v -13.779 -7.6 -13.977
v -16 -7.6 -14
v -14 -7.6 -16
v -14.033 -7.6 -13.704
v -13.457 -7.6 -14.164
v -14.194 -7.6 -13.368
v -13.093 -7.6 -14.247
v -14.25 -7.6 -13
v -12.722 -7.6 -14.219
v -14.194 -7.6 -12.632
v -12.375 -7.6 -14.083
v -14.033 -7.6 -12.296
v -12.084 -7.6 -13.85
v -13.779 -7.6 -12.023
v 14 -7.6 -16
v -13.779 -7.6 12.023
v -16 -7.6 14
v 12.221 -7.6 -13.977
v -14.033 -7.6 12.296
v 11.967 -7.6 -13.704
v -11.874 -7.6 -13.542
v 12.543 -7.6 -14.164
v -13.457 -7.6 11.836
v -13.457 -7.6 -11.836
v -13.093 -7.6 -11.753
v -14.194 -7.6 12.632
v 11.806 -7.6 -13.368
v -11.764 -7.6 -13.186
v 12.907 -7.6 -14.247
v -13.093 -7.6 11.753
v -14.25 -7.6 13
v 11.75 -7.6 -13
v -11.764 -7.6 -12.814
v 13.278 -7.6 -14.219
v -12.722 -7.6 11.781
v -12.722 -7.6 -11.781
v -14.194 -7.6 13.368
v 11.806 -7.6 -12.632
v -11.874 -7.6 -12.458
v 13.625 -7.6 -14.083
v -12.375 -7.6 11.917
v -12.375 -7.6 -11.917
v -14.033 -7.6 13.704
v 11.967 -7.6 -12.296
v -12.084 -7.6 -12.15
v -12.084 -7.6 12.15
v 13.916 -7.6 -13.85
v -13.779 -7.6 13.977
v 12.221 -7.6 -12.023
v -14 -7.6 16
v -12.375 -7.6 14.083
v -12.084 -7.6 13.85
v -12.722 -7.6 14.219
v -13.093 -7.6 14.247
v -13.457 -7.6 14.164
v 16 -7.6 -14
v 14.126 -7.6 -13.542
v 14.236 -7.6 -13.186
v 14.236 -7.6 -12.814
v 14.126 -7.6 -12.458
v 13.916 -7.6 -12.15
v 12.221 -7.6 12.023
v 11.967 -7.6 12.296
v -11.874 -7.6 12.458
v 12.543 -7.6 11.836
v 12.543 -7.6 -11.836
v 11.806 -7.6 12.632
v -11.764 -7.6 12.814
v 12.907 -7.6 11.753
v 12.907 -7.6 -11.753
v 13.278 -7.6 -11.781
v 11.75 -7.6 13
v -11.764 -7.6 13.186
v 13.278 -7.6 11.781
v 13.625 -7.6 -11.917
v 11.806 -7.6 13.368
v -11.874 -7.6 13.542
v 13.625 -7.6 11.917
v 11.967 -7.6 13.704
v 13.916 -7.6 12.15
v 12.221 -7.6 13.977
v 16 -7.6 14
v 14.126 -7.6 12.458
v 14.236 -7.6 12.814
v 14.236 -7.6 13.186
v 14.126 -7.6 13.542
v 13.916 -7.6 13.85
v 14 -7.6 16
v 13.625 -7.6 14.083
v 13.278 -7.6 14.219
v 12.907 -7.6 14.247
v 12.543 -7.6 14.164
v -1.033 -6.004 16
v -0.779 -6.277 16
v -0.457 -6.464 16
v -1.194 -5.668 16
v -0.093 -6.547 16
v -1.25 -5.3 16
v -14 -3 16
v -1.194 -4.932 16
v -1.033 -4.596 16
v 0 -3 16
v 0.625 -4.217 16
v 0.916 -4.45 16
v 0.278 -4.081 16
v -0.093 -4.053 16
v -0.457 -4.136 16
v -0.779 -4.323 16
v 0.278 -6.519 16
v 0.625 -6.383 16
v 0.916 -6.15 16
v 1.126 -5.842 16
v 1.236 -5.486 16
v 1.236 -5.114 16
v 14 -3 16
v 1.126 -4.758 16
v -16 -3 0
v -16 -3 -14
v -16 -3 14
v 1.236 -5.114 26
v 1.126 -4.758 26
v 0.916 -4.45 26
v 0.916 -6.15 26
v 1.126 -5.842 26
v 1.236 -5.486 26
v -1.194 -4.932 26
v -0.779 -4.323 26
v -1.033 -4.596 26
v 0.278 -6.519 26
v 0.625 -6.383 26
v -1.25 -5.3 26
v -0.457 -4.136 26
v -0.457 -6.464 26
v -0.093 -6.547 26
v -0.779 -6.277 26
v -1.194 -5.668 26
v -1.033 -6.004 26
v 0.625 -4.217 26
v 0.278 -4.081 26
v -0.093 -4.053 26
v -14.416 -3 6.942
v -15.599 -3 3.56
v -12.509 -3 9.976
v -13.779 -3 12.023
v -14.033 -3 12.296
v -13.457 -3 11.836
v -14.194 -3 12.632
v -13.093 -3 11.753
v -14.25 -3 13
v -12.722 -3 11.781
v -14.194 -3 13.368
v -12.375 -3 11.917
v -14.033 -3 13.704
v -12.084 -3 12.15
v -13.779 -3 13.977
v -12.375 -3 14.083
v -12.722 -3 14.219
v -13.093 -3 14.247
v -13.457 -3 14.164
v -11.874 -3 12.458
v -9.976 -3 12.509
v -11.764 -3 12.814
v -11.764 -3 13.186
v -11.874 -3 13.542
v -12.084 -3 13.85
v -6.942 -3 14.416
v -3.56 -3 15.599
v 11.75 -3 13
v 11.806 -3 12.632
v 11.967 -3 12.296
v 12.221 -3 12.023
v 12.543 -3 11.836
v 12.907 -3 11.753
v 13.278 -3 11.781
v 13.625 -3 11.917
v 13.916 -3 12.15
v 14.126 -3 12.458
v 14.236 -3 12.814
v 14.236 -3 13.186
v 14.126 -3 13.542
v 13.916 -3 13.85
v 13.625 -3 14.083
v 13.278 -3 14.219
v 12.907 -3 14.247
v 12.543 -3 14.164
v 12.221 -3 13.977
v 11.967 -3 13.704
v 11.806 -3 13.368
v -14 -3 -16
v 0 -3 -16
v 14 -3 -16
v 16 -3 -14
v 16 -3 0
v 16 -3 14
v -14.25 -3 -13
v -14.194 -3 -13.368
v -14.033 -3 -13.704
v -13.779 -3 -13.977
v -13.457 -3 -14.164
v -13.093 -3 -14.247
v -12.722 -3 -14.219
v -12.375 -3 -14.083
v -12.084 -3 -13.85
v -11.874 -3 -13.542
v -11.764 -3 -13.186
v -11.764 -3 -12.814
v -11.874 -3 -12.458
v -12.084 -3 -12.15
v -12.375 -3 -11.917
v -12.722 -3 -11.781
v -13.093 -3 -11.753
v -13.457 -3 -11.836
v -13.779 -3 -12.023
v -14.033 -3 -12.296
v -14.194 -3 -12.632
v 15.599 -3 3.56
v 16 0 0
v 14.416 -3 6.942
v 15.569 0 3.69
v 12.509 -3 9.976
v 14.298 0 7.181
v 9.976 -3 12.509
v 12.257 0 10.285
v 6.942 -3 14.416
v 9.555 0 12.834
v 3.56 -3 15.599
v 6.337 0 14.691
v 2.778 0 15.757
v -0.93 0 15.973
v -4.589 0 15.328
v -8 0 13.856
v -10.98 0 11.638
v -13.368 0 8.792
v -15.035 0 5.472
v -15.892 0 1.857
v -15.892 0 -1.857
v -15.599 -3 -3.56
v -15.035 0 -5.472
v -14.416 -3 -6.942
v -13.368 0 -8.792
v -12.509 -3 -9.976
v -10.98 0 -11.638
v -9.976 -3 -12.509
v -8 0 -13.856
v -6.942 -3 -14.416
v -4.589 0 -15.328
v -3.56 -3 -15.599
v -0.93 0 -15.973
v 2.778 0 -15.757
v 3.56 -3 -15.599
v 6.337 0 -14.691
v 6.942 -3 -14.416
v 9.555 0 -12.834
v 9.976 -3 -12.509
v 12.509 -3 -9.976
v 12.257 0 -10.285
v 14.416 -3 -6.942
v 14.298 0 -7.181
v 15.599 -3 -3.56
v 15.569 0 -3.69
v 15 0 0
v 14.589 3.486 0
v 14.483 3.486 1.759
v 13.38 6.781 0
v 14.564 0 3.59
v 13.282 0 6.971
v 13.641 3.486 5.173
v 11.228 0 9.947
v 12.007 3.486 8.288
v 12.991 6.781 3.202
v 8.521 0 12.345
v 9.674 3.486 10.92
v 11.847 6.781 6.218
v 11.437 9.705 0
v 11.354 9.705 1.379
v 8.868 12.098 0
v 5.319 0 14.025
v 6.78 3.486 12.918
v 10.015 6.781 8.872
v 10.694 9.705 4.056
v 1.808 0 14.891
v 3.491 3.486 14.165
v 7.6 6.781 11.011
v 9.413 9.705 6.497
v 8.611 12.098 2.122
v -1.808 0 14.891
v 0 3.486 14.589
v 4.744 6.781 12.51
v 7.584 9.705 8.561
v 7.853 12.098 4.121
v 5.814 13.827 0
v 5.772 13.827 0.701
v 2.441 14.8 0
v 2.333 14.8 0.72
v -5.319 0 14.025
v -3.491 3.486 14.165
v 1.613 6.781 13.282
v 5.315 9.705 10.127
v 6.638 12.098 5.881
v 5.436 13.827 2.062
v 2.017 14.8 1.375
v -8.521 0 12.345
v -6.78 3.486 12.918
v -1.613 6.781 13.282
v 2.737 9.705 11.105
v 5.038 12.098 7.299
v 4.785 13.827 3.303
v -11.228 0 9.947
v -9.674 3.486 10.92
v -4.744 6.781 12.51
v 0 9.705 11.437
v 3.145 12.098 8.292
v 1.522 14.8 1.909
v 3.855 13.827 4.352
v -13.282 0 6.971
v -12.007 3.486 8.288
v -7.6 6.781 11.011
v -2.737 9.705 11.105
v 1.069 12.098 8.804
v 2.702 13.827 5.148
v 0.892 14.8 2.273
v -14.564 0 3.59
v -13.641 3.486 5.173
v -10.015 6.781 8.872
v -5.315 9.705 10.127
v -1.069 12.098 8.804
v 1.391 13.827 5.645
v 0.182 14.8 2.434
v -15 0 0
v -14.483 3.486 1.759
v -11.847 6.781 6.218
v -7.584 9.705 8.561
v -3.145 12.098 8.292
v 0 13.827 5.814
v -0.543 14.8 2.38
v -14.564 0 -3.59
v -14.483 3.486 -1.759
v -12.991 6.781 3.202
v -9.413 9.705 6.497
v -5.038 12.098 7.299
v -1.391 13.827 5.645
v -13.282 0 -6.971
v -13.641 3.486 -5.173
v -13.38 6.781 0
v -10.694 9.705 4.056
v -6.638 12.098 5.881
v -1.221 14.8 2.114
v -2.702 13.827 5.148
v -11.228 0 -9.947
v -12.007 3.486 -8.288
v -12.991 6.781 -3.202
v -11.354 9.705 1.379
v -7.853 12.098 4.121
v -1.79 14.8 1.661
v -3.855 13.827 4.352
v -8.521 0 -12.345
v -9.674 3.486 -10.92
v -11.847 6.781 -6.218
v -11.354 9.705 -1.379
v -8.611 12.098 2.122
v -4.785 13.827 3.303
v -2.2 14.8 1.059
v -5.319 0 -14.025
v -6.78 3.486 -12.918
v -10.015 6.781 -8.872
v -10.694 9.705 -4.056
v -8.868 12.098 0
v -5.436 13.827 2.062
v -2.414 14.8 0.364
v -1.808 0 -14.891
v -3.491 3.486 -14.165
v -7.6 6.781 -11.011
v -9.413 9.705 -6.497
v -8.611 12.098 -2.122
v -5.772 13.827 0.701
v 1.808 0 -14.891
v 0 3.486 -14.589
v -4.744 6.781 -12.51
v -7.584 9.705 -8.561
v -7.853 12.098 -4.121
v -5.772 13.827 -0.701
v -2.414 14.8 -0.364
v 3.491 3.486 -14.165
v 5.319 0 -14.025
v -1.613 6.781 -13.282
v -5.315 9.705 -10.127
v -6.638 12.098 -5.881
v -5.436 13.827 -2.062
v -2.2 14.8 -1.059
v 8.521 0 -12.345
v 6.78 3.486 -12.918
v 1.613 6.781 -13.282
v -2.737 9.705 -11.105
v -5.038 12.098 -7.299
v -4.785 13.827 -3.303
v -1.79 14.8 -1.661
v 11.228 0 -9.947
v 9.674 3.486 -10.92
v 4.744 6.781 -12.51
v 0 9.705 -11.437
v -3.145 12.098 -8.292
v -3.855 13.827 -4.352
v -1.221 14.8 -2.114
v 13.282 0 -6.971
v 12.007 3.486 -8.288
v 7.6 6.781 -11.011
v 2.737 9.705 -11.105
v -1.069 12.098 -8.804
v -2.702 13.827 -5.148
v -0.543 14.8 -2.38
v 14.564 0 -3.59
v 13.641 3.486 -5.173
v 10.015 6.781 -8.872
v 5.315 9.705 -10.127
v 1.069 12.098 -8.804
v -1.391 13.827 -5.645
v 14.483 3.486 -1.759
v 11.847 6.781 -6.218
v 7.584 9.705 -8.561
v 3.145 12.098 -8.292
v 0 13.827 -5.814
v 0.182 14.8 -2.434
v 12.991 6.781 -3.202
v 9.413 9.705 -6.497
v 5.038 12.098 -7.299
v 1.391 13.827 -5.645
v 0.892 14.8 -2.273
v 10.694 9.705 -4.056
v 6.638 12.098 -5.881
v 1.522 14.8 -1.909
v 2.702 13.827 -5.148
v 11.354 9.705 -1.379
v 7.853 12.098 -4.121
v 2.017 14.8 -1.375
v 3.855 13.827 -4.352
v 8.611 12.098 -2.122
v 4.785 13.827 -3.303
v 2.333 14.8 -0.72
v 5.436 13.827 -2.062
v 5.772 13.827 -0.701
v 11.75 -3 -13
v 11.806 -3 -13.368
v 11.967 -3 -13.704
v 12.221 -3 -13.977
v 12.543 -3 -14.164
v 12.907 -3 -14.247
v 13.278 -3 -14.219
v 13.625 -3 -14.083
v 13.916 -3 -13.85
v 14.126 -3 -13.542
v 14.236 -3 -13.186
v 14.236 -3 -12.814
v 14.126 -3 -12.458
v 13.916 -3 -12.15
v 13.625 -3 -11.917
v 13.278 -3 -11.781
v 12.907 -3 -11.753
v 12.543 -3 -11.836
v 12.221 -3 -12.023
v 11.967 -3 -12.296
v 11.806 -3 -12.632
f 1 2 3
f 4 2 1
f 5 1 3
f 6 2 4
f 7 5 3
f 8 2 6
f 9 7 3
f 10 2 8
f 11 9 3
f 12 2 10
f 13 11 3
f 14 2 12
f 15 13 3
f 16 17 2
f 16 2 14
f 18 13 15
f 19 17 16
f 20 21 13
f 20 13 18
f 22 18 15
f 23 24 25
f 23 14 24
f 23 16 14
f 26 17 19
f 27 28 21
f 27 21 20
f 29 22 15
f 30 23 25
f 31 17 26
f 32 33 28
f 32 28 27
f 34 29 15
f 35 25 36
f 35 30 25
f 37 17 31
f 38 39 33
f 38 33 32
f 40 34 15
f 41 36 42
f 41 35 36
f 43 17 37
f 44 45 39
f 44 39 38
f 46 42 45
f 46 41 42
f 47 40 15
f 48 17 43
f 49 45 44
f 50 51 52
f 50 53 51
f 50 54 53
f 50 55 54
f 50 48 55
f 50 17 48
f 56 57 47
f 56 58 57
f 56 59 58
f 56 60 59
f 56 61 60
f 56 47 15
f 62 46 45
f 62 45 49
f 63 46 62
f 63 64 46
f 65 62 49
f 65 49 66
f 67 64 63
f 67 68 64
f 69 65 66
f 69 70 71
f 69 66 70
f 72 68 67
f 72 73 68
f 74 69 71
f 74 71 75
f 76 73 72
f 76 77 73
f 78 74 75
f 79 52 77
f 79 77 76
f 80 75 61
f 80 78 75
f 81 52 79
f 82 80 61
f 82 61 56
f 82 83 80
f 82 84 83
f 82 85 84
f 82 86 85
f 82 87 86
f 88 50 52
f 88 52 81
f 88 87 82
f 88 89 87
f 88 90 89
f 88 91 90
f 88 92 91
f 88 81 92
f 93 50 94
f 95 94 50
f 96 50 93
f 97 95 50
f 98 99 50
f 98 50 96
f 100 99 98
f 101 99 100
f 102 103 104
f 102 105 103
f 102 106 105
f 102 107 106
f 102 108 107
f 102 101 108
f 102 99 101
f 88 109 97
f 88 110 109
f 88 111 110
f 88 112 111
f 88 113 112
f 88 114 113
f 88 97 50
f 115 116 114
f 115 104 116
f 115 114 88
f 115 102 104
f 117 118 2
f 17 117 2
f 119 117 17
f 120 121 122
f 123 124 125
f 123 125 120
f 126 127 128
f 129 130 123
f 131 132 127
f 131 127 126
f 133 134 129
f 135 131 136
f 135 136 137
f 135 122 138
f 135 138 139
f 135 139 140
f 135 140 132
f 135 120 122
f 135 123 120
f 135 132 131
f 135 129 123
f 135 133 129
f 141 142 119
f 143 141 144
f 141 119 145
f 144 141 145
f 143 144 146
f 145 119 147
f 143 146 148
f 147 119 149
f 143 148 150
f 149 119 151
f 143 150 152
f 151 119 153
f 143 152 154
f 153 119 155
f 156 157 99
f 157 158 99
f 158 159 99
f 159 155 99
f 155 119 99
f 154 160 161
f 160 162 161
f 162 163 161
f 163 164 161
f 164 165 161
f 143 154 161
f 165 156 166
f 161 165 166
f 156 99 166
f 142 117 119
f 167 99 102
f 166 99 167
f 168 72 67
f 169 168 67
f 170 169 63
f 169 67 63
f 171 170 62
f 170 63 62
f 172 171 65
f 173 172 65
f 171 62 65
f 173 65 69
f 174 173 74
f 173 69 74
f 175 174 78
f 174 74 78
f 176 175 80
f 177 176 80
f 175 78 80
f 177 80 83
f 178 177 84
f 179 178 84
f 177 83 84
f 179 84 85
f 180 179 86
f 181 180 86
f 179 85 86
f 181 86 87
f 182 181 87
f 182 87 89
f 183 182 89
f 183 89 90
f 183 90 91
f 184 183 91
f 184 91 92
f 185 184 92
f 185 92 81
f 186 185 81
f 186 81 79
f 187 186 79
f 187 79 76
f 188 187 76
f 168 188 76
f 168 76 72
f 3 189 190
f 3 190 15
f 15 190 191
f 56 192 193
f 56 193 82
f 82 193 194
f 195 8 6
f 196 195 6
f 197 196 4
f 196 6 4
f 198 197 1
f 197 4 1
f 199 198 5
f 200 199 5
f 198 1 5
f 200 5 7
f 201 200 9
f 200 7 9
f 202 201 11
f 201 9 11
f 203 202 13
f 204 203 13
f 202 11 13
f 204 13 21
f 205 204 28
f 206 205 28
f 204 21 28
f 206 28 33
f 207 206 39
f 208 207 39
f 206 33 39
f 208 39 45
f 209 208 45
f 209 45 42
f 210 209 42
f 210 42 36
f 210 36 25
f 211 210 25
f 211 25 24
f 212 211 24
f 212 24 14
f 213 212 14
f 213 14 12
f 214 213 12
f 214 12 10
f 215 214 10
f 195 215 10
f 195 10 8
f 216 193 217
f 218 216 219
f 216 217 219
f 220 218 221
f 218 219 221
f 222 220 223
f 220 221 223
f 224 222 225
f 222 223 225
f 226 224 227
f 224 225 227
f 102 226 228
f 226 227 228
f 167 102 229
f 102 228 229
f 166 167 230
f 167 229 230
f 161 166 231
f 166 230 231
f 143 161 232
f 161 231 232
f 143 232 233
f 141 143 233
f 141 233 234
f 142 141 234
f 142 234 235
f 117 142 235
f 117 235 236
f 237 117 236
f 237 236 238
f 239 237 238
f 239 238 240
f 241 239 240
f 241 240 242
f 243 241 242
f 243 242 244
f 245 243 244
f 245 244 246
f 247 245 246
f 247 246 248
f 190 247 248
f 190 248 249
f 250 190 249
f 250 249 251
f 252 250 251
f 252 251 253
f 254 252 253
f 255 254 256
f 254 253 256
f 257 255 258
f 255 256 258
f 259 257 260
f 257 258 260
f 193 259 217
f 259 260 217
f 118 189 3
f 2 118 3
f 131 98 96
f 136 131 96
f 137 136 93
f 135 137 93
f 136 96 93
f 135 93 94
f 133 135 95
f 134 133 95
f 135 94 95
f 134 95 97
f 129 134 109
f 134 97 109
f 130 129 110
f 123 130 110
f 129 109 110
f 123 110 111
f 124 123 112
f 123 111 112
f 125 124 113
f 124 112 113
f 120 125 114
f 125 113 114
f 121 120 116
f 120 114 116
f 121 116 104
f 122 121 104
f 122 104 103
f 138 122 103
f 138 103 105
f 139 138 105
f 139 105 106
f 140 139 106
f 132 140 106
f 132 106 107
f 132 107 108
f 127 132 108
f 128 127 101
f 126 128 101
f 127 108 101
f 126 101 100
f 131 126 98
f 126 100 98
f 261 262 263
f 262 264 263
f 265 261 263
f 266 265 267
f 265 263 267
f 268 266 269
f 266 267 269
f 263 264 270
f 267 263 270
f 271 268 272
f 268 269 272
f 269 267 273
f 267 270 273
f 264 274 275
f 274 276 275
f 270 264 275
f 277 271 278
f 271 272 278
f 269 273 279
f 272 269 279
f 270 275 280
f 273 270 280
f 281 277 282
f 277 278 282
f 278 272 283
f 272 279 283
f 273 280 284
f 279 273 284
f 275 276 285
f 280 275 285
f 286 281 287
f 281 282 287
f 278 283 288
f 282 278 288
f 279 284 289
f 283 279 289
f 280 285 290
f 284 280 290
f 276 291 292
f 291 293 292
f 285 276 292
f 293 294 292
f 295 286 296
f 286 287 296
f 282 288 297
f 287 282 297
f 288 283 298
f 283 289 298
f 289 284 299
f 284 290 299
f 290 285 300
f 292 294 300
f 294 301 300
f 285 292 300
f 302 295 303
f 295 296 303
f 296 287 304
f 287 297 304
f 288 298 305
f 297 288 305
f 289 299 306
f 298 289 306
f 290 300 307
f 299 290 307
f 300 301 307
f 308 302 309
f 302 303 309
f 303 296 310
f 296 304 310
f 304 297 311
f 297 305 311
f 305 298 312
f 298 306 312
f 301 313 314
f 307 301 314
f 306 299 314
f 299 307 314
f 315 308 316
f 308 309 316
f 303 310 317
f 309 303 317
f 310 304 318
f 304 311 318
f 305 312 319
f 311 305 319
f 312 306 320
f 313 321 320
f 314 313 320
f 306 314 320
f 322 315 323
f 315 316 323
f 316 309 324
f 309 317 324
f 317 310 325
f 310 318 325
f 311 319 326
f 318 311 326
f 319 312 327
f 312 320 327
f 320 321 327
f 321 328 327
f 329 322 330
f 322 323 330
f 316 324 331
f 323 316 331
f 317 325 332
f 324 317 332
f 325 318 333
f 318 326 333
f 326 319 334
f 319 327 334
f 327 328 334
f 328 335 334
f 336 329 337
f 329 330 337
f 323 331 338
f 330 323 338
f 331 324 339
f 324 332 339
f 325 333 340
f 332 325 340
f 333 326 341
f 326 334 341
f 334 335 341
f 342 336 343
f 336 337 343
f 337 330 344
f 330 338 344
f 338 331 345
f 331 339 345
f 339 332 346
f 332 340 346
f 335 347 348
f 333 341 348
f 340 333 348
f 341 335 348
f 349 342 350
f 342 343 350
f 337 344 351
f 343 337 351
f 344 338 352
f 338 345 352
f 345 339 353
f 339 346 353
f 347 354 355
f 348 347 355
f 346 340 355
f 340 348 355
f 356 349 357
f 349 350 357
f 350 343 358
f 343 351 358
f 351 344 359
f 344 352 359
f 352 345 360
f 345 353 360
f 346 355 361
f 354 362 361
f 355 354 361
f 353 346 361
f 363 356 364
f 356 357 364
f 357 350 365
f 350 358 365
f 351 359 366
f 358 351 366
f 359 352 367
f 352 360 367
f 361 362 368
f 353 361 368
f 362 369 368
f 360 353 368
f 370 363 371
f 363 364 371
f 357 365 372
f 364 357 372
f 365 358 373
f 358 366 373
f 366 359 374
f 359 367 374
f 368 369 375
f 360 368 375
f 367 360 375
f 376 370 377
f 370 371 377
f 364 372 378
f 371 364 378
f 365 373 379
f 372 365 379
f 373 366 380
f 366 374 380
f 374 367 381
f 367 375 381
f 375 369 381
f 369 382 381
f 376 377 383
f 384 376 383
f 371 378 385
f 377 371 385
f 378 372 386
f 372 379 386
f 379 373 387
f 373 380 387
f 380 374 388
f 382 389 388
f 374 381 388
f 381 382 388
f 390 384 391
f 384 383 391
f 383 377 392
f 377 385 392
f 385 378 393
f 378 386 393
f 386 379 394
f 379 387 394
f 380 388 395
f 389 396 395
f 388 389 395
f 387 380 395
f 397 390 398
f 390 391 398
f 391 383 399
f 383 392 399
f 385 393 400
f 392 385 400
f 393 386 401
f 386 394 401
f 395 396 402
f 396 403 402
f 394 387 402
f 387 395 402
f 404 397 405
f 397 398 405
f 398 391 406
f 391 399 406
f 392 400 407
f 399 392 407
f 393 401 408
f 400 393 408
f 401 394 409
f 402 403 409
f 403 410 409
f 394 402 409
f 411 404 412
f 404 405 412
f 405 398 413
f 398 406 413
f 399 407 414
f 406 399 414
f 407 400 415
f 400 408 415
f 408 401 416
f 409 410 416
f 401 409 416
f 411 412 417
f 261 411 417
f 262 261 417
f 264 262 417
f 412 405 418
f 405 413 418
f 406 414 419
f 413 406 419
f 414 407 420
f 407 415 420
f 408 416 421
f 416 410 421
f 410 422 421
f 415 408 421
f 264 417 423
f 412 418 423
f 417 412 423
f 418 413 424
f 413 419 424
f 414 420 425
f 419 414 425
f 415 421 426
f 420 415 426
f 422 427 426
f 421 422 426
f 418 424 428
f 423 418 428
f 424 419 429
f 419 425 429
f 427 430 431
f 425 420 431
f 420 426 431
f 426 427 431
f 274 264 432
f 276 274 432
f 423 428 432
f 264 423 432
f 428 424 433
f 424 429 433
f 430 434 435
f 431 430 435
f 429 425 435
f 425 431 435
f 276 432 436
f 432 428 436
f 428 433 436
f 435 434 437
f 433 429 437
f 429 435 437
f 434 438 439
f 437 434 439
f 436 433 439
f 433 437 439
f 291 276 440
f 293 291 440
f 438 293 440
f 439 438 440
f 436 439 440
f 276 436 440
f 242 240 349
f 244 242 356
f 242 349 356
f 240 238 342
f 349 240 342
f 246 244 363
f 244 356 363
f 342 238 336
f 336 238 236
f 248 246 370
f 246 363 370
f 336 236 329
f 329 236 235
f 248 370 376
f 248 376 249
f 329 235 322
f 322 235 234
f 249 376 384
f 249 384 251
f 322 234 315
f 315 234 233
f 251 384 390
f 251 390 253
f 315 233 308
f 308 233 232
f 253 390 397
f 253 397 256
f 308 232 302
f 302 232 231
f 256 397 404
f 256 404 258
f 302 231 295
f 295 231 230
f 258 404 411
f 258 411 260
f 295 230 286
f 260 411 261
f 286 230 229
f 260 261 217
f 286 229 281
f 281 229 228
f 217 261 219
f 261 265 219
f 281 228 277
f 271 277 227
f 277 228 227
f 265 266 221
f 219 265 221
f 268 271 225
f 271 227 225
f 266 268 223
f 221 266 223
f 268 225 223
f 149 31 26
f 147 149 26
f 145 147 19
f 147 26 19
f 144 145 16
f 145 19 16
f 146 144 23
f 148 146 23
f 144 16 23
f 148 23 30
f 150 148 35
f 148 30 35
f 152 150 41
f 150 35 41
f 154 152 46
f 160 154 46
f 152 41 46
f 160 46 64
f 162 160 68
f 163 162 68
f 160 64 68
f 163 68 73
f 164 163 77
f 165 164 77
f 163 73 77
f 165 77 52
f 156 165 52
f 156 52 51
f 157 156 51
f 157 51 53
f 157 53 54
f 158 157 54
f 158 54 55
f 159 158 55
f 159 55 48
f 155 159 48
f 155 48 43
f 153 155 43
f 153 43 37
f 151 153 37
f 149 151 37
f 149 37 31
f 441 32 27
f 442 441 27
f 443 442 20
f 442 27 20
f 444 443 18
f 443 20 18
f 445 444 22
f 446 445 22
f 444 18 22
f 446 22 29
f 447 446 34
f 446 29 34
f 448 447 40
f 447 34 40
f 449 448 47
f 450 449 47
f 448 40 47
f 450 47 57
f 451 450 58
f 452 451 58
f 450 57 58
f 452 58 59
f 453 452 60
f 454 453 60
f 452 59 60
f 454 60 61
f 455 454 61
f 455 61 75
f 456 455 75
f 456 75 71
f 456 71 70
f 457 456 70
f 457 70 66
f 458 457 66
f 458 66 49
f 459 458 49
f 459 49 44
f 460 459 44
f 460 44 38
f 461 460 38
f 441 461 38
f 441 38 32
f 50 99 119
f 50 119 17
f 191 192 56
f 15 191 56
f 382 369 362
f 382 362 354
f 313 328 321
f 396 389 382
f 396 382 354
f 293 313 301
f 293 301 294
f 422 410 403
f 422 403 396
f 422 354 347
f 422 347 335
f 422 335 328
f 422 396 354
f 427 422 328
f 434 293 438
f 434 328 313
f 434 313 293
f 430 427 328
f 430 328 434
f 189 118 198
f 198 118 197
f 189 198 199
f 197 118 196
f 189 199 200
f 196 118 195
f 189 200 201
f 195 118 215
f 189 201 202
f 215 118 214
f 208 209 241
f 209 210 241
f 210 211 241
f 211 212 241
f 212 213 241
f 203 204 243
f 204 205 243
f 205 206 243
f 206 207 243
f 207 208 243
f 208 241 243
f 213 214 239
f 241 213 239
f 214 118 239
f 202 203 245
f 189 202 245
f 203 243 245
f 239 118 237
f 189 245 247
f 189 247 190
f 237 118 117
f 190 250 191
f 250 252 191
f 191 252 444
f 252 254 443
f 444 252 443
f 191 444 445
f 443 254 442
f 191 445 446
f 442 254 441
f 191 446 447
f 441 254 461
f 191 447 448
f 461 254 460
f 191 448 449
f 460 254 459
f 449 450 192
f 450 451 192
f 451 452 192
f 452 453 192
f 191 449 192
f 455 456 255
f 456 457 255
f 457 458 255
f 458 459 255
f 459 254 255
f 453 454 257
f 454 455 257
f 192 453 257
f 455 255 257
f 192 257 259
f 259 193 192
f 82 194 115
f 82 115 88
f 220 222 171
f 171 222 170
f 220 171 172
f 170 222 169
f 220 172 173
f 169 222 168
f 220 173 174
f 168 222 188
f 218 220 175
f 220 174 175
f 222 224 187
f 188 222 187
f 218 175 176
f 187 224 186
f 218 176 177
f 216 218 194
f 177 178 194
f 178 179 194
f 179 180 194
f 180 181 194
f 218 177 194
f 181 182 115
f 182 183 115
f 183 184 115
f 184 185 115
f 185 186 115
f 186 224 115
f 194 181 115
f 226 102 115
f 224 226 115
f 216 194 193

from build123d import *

# Parameters (mm, degrees)
SKETCH2_R             = 16
BOSS_EXTRUDE1_DEPTH   = 3
SKETCH3_W             = 32
SKETCH3_H             = 32
BOSS_EXTRUDE2_DEPTH   = 4.6
F_2_5MM_DOWEL_HOLE1_D = 2.5
CHAMFER1_SIZE         = 2
SKETCH11_R            = 1.25
BOSS_EXTRUDE3_DEPTH   = 10
SKETCH12_R            = 16
CUT_EXTRUDE1_DEPTH    = 38.865023439


with BuildPart() as part:
    # Sketch1 → Revolve1 (revolve)
    with BuildSketch(Plane.XY):
        with BuildLine():
            Line((0, 0), (15, 0))
            ThreePointArc((15, 0), (10.606601718, 10.606601718), (0, 15))
            Line((0, 15), (0, 0))
        make_face()
    revolve(axis=Axis((0, 15, 0), (0, -1, 0)))

    # Sketch2 → Boss-Extrude1 (add)
    with BuildSketch(Plane.XZ):
        Circle(SKETCH2_R)
    extrude(amount=BOSS_EXTRUDE1_DEPTH)

    # Sketch3 → Boss-Extrude2 (add)
    with BuildSketch(Plane.XZ.offset(3)):
        Rectangle(SKETCH3_W, SKETCH3_H)
    extrude(amount=BOSS_EXTRUDE2_DEPTH)

    # Ø2.5mm Dowel Hole1 (through all)
    with Locations(Plane(origin=(0, -3, 0), x_dir=(1, 0, 0), z_dir=(0, 1, 0))):
        with Locations((-13, 13), (13, -13), (13, 13), (-13, -13)):
            Hole(F_2_5MM_DOWEL_HOLE1_D / 2)

    # Chamfer1
    chamfer1_edges = [part.edges().sort_by_distance(p)[0] for p in [
        (16, -5.3, -16),
        (16, -5.3, 16),
        (-16, -5.3, 16),
        (-16, -5.3, -16),
    ]]
    chamfer(chamfer1_edges, length=CHAMFER1_SIZE)

    # Sketch11 → Boss-Extrude3 (add)
    with BuildSketch(Plane.XY.offset(16)):
        with Locations(Location((0, -5.3, 0), (0, 0, 180))):
            Circle(SKETCH11_R)
    extrude(amount=BOSS_EXTRUDE3_DEPTH)

    # Sketch12 → Cut-Extrude1 (cut, through all)
    with BuildSketch(Plane(origin=(0, 14.8, 0), x_dir=(1, 0, 0), z_dir=(0, 1, 0))):
        Circle(SKETCH12_R)
    extrude(amount=CUT_EXTRUDE1_DEPTH, mode=Mode.SUBTRACT)


solid = part.part
